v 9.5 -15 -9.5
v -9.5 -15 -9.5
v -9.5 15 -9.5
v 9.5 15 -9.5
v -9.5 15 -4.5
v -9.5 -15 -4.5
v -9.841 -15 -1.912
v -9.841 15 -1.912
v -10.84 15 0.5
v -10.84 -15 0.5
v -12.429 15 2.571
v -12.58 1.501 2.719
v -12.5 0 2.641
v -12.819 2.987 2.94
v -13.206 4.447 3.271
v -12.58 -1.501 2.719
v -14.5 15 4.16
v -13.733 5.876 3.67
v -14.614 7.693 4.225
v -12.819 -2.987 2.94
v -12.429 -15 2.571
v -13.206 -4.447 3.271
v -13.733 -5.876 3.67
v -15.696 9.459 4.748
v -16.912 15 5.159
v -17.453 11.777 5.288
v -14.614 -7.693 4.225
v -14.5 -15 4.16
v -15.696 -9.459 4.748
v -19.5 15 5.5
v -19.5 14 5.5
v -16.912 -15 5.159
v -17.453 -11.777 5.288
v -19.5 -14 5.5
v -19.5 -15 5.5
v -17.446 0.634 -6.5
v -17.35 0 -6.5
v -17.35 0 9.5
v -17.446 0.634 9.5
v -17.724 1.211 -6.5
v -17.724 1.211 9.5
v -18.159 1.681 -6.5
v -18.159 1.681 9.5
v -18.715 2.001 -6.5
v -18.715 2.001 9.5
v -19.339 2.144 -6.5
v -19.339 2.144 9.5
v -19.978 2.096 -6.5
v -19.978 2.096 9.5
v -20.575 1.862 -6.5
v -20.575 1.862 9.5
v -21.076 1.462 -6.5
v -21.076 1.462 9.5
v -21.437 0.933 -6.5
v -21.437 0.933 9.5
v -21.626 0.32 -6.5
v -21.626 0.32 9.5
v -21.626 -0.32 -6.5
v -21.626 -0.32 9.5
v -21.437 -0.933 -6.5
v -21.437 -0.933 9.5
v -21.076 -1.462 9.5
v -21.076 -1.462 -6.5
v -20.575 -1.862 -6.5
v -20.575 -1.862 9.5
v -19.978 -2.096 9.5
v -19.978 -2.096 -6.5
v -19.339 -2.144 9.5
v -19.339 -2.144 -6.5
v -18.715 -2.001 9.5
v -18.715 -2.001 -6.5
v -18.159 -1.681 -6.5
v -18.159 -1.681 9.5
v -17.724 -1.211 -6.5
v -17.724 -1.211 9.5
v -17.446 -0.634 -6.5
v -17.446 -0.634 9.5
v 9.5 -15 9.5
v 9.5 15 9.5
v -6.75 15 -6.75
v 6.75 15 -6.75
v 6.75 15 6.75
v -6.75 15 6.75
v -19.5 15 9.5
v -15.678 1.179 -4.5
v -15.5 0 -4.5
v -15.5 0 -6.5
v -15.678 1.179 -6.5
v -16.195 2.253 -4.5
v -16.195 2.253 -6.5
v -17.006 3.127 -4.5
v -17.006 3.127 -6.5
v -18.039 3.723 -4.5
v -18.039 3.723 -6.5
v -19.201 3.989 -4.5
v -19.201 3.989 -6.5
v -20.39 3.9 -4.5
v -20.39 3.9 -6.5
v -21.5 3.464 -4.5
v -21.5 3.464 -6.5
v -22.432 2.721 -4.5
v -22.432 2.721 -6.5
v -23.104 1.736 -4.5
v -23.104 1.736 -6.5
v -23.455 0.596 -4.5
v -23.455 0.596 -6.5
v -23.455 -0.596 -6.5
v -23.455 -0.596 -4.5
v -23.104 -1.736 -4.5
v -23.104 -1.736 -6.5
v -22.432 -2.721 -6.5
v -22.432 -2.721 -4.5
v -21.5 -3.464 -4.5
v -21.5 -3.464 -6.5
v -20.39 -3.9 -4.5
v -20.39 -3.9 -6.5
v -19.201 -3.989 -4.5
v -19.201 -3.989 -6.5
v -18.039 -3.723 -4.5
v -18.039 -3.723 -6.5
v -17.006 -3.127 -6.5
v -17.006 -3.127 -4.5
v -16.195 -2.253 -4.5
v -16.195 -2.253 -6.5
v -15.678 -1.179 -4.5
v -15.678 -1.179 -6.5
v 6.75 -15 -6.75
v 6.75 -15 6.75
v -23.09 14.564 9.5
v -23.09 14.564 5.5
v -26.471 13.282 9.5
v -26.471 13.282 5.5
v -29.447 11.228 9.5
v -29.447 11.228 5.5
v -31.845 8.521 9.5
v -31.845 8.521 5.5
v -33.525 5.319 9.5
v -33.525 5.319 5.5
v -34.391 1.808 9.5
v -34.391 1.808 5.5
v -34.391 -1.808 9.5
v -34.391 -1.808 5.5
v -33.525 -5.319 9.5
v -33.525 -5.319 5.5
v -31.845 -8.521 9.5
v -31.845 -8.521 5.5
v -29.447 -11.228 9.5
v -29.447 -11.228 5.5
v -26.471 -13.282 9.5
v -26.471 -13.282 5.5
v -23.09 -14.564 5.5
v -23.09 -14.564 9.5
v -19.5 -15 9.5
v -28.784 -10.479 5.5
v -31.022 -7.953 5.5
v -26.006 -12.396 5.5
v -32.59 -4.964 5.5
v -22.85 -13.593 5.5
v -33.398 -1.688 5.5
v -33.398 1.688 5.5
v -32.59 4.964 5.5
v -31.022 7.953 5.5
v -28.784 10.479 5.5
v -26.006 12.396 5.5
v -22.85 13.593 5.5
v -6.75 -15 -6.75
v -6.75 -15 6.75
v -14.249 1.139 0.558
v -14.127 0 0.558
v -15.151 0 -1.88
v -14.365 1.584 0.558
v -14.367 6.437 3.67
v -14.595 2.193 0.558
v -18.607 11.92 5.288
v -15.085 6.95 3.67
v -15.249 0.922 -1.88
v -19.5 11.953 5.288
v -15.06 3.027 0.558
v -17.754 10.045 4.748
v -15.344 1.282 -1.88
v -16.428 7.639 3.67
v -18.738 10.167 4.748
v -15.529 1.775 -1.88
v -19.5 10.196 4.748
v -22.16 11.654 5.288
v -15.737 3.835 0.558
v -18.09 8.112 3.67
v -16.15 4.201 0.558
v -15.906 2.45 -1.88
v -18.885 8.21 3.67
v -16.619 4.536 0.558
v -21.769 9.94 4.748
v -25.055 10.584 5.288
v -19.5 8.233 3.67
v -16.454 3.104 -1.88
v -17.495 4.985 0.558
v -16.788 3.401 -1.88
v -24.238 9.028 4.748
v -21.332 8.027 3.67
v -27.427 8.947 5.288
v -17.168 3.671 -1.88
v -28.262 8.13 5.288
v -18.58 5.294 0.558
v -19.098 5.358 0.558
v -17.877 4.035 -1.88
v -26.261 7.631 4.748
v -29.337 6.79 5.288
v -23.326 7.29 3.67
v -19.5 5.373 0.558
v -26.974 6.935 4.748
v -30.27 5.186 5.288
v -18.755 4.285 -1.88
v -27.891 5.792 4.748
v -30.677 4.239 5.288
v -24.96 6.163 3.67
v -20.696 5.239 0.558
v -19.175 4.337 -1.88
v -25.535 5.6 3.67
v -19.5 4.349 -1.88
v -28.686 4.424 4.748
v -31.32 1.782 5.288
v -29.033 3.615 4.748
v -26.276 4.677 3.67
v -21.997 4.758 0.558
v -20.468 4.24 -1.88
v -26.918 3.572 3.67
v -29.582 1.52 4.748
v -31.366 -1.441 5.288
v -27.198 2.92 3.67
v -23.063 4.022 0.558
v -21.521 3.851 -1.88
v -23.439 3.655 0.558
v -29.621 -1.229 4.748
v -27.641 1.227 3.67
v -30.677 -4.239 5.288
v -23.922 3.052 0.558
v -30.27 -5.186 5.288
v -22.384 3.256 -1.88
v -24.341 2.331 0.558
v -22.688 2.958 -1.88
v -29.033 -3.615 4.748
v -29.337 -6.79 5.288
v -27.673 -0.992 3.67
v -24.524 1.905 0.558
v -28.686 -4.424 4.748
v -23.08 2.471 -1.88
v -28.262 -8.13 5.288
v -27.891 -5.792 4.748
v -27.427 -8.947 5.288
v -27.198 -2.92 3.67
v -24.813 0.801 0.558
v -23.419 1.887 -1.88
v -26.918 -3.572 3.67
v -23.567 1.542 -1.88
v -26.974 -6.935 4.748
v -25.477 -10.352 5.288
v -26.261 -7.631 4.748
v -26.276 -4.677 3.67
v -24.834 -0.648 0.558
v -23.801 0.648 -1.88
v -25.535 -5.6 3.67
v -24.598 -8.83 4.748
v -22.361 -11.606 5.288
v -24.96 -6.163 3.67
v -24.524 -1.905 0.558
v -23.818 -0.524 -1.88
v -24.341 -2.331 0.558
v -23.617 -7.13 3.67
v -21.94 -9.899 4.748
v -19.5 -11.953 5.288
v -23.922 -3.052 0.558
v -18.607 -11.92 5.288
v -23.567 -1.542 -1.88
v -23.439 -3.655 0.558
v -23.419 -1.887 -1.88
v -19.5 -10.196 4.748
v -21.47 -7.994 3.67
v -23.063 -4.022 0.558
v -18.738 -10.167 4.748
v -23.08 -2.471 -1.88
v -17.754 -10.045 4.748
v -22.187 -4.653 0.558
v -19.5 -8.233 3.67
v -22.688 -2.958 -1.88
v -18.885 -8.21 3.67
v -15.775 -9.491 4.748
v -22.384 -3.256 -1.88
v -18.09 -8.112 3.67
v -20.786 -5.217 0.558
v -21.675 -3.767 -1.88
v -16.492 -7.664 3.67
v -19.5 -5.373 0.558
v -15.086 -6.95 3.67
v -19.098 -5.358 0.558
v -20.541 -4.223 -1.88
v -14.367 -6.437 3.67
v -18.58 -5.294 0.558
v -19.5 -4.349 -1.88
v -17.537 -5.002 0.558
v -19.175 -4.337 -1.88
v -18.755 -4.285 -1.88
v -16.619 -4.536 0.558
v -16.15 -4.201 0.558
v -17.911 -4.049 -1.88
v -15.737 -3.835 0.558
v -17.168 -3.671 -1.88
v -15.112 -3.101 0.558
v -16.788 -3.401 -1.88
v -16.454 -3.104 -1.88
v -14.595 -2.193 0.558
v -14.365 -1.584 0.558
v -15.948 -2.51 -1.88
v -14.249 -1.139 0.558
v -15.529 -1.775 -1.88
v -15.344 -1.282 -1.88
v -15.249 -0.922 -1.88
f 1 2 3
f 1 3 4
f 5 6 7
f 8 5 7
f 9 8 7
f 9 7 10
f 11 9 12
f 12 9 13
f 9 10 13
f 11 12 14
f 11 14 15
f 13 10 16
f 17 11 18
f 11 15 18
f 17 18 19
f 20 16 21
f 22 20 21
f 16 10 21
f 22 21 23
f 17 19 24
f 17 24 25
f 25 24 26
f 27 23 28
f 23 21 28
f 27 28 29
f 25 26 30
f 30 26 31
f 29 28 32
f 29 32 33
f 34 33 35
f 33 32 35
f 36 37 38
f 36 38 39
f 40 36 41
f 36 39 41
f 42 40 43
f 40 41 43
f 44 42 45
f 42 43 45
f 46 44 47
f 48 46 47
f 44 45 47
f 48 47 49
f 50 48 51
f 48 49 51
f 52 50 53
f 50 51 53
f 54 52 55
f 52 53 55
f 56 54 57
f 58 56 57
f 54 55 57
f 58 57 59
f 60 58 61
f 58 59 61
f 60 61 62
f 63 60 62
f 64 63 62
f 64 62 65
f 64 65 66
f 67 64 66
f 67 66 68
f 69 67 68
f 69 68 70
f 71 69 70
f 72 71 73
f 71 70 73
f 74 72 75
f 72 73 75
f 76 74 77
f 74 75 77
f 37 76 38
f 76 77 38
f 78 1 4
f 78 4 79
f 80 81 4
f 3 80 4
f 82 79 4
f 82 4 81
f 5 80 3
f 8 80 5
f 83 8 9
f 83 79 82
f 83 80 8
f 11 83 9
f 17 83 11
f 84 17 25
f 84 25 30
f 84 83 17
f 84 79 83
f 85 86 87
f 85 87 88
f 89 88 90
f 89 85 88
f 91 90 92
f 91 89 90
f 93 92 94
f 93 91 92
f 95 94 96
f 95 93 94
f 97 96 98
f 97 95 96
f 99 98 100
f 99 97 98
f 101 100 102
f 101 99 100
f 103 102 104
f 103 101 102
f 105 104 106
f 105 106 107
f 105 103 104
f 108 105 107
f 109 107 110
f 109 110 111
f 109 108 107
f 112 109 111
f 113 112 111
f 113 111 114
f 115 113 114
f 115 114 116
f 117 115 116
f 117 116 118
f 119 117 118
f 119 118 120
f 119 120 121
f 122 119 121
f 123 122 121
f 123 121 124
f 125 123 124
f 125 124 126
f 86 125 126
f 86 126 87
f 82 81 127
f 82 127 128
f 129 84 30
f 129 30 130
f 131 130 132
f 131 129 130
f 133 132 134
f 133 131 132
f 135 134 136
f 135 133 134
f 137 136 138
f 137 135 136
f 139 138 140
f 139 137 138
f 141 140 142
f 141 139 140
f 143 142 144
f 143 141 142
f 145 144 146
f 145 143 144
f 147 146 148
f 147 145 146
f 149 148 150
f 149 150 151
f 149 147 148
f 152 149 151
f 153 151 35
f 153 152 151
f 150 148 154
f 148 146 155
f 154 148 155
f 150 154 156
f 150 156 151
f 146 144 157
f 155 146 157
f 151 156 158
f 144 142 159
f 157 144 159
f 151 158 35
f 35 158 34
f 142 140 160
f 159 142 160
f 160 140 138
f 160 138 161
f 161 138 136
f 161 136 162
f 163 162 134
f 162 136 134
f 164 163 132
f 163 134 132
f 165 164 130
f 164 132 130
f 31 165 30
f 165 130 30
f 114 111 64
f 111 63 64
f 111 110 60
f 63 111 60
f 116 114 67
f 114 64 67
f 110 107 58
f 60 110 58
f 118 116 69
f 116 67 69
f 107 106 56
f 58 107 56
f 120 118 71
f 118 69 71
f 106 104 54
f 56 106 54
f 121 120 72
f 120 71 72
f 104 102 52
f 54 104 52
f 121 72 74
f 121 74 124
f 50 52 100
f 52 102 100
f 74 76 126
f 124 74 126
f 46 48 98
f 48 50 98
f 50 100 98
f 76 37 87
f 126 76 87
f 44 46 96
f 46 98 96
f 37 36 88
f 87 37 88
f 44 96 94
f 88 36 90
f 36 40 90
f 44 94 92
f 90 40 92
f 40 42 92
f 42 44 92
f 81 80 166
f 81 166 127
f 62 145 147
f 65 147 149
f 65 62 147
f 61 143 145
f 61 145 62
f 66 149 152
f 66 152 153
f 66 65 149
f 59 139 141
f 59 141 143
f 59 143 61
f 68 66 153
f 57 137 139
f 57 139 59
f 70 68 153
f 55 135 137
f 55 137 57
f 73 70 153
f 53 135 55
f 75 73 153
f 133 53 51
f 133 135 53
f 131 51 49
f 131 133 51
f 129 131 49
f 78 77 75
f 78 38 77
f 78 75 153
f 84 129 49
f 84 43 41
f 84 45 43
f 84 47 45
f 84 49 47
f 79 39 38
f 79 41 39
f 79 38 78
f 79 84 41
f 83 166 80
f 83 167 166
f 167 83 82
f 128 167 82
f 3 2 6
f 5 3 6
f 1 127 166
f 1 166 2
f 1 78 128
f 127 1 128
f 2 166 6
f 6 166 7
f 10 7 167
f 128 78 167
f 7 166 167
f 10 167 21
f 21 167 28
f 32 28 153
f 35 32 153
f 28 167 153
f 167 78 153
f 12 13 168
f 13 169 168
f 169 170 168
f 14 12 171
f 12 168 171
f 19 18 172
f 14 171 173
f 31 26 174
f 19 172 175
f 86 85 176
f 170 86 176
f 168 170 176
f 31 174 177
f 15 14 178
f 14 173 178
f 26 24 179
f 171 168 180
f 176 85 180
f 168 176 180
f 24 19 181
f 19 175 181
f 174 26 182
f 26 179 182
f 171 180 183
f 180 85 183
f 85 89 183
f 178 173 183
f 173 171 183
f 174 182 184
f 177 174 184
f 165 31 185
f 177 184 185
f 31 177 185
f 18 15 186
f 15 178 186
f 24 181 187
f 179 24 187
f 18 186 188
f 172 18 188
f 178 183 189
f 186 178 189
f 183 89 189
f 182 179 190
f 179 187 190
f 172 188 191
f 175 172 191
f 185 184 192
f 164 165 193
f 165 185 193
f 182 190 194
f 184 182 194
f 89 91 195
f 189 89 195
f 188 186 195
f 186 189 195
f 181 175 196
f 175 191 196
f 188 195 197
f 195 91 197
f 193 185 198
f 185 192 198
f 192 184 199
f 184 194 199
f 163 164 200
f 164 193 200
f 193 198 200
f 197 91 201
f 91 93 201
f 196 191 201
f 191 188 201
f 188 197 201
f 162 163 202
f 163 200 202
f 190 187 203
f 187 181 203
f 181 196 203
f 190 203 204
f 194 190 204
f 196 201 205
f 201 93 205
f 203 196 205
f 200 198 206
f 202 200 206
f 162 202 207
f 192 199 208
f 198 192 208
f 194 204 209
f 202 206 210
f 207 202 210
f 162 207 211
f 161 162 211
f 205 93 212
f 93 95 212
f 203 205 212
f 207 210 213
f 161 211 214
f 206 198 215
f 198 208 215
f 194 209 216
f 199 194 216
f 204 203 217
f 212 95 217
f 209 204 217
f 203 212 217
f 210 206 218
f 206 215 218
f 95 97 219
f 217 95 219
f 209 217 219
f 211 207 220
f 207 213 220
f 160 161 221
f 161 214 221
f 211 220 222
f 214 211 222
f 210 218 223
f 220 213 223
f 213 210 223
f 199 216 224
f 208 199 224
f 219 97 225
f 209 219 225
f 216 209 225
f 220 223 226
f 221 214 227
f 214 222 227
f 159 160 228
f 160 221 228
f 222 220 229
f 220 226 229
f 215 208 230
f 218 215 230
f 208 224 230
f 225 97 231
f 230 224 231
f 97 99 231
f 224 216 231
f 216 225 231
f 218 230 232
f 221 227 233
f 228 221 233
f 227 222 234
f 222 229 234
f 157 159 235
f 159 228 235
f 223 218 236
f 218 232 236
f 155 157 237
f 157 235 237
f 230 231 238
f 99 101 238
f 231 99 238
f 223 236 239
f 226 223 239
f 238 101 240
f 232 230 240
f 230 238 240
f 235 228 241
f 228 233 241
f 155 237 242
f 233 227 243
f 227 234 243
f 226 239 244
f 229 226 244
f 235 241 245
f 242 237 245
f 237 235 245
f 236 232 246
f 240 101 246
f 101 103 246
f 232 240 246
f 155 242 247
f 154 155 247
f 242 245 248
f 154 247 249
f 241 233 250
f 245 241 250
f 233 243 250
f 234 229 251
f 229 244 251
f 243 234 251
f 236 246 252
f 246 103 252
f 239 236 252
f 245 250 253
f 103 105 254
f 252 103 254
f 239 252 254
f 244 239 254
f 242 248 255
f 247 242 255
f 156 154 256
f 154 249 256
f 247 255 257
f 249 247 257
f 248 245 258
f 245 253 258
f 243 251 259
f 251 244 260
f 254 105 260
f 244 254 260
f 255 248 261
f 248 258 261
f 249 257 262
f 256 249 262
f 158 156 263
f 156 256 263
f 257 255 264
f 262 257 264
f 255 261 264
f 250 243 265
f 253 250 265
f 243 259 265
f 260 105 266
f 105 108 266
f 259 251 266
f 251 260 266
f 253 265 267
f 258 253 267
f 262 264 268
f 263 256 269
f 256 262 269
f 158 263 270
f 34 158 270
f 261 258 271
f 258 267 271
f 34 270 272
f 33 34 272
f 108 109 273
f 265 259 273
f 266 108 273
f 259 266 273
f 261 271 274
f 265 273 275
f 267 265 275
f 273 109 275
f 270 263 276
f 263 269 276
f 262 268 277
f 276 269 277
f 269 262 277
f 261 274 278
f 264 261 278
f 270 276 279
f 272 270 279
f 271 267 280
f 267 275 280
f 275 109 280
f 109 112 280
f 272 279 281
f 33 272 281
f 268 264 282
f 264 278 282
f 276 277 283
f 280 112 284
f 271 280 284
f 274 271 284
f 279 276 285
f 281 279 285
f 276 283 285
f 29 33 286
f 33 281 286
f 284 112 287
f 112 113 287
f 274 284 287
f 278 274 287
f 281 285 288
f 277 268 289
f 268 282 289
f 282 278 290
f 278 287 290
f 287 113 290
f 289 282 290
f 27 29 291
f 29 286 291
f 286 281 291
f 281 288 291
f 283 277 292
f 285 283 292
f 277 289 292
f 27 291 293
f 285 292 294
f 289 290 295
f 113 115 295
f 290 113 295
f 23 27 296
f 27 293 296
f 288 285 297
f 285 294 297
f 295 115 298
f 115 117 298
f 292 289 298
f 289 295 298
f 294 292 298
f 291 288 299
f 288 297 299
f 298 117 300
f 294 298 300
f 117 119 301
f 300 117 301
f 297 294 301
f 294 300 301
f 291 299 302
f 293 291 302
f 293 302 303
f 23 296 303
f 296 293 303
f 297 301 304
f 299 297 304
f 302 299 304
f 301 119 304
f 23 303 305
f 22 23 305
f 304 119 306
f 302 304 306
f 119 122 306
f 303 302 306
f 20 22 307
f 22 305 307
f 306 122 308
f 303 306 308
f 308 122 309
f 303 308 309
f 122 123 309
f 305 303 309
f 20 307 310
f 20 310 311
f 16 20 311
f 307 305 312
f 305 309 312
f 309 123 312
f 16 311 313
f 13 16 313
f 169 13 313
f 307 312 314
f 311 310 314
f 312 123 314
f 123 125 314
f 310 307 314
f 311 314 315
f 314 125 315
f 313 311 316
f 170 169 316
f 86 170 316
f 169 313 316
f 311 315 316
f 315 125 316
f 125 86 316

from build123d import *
from build123d import SkipClean  # not in build123d's __all__

# Parameters (mm, degrees)
F0_W         = 19
F0_H         = 19
F0_W_2       = 13.5
F0_H_2       = 13.5
F1_DEPTH     = 15
F2_R         = 4
F2_R_2       = 2.15
F3_DEPTH     = 4
F4_DEPTH     = 16
F5_T9_DEPTH  = 30
F5_S10_R     = 2.15
F5_T11_DEPTH = 18


# Not quite as in the source:
# - a fillet or chamfer that OpenCascade refuses, or shapes differently, is made with other operations: its cross-section is extruded or revolved along the edge and cut away or added


with BuildPart() as f1:
    # F0 (on Front) → F1 (new body, symmetric)
    with BuildSketch(Plane.XZ):
        Rectangle(F0_W, F0_H)
        Rectangle(F0_W_2, F0_H_2, mode=Mode.SUBTRACT)
    extrude(amount=F1_DEPTH, both=True)

    # F2 (on face) → F3 (join)
    with BuildSketch(Plane.XY.offset(9.5)):
        with BuildLine():
            Line((-9.5, -15), (-9.5, 15))
            Line((-9.5, 15), (-19.5, 15))
            ThreePointArc((-19.5, 15), (-34.5, 0), (-19.5, -15))
            Line((-19.5, -15), (-9.5, -15))
        make_face()
        with Locations((-19.5, 0)):
            Circle(F2_R, mode=Mode.SUBTRACT)
        with Locations((-19.5, 0)):
            Circle(F2_R)
        with Locations((-19.5, 0)):
            Circle(F2_R_2, mode=Mode.SUBTRACT)
    extrude(amount=-F3_DEPTH)

    # F2 (on face) → F4 (join)
    with BuildSketch(Plane.XY.offset(9.5)):
        with Locations((-19.5, 0)):
            Circle(F2_R)
        with Locations((-19.5, 0)):
            Circle(F2_R_2, mode=Mode.SUBTRACT)
    extrude(amount=-F4_DEPTH)

    # F5: fillet of radius 10 on 2 edges, made by hand


with BuildPart() as f5_tool2:
    # F5_s3 → F5_t4 (revolve)
    with BuildSketch(Plane.XZ):
        with BuildLine():
            ThreePointArc((-5.5, 5.5), (-12.5710678119, 2.5710678119), (-15.5, -4.5))
            Line((-15.5, -4.5), (-15.5, 5.5))
            Line((-15.5, 5.5), (-5.5, 5.5))
        make_face()
    revolve(axis=Axis((-19.5, 0, 5.5), (0, 0, 1)))

    split(bisect_by=Plane.YZ.offset(-6.75), keep=Keep.BOTTOM)


with BuildPart() as f1_1:
    add(f1.part, clean=False)

    # F5_t1: union F5_tool2
    add(f5_tool2.part)


with BuildPart() as f5_tool7:
    # F5_s8 → F5_t9 (new body)
    with BuildSketch(Plane.XZ.offset(15)):
        with BuildLine():
            ThreePointArc((-9.5, -4.5), (-12.4289321881, 2.5710678119), (-19.5, 5.5))
            Line((-19.5, 5.5), (-9.5, 5.5))
            Line((-9.5, 5.5), (-9.5, -4.5))
        make_face()
    extrude(amount=-F5_T9_DEPTH)

    # F5_s10 → F5_t11 (cut, symmetric)
    with BuildSketch(Plane.XY.offset(0.5)):
        with Locations((-19.5, 0)):
            Circle(F5_S10_R)
    with SkipClean():  # cleaning this boolean's faces spoils the solid; the shape is the same uncleaned
        extrude(amount=F5_T11_DEPTH, both=True, mode=Mode.SUBTRACT)


with BuildPart() as f1_2:
    add(f1_1.part, clean=False)

    # F5_t6: union F5_tool7
    add(f5_tool7.part)


solid = f1_2.part
